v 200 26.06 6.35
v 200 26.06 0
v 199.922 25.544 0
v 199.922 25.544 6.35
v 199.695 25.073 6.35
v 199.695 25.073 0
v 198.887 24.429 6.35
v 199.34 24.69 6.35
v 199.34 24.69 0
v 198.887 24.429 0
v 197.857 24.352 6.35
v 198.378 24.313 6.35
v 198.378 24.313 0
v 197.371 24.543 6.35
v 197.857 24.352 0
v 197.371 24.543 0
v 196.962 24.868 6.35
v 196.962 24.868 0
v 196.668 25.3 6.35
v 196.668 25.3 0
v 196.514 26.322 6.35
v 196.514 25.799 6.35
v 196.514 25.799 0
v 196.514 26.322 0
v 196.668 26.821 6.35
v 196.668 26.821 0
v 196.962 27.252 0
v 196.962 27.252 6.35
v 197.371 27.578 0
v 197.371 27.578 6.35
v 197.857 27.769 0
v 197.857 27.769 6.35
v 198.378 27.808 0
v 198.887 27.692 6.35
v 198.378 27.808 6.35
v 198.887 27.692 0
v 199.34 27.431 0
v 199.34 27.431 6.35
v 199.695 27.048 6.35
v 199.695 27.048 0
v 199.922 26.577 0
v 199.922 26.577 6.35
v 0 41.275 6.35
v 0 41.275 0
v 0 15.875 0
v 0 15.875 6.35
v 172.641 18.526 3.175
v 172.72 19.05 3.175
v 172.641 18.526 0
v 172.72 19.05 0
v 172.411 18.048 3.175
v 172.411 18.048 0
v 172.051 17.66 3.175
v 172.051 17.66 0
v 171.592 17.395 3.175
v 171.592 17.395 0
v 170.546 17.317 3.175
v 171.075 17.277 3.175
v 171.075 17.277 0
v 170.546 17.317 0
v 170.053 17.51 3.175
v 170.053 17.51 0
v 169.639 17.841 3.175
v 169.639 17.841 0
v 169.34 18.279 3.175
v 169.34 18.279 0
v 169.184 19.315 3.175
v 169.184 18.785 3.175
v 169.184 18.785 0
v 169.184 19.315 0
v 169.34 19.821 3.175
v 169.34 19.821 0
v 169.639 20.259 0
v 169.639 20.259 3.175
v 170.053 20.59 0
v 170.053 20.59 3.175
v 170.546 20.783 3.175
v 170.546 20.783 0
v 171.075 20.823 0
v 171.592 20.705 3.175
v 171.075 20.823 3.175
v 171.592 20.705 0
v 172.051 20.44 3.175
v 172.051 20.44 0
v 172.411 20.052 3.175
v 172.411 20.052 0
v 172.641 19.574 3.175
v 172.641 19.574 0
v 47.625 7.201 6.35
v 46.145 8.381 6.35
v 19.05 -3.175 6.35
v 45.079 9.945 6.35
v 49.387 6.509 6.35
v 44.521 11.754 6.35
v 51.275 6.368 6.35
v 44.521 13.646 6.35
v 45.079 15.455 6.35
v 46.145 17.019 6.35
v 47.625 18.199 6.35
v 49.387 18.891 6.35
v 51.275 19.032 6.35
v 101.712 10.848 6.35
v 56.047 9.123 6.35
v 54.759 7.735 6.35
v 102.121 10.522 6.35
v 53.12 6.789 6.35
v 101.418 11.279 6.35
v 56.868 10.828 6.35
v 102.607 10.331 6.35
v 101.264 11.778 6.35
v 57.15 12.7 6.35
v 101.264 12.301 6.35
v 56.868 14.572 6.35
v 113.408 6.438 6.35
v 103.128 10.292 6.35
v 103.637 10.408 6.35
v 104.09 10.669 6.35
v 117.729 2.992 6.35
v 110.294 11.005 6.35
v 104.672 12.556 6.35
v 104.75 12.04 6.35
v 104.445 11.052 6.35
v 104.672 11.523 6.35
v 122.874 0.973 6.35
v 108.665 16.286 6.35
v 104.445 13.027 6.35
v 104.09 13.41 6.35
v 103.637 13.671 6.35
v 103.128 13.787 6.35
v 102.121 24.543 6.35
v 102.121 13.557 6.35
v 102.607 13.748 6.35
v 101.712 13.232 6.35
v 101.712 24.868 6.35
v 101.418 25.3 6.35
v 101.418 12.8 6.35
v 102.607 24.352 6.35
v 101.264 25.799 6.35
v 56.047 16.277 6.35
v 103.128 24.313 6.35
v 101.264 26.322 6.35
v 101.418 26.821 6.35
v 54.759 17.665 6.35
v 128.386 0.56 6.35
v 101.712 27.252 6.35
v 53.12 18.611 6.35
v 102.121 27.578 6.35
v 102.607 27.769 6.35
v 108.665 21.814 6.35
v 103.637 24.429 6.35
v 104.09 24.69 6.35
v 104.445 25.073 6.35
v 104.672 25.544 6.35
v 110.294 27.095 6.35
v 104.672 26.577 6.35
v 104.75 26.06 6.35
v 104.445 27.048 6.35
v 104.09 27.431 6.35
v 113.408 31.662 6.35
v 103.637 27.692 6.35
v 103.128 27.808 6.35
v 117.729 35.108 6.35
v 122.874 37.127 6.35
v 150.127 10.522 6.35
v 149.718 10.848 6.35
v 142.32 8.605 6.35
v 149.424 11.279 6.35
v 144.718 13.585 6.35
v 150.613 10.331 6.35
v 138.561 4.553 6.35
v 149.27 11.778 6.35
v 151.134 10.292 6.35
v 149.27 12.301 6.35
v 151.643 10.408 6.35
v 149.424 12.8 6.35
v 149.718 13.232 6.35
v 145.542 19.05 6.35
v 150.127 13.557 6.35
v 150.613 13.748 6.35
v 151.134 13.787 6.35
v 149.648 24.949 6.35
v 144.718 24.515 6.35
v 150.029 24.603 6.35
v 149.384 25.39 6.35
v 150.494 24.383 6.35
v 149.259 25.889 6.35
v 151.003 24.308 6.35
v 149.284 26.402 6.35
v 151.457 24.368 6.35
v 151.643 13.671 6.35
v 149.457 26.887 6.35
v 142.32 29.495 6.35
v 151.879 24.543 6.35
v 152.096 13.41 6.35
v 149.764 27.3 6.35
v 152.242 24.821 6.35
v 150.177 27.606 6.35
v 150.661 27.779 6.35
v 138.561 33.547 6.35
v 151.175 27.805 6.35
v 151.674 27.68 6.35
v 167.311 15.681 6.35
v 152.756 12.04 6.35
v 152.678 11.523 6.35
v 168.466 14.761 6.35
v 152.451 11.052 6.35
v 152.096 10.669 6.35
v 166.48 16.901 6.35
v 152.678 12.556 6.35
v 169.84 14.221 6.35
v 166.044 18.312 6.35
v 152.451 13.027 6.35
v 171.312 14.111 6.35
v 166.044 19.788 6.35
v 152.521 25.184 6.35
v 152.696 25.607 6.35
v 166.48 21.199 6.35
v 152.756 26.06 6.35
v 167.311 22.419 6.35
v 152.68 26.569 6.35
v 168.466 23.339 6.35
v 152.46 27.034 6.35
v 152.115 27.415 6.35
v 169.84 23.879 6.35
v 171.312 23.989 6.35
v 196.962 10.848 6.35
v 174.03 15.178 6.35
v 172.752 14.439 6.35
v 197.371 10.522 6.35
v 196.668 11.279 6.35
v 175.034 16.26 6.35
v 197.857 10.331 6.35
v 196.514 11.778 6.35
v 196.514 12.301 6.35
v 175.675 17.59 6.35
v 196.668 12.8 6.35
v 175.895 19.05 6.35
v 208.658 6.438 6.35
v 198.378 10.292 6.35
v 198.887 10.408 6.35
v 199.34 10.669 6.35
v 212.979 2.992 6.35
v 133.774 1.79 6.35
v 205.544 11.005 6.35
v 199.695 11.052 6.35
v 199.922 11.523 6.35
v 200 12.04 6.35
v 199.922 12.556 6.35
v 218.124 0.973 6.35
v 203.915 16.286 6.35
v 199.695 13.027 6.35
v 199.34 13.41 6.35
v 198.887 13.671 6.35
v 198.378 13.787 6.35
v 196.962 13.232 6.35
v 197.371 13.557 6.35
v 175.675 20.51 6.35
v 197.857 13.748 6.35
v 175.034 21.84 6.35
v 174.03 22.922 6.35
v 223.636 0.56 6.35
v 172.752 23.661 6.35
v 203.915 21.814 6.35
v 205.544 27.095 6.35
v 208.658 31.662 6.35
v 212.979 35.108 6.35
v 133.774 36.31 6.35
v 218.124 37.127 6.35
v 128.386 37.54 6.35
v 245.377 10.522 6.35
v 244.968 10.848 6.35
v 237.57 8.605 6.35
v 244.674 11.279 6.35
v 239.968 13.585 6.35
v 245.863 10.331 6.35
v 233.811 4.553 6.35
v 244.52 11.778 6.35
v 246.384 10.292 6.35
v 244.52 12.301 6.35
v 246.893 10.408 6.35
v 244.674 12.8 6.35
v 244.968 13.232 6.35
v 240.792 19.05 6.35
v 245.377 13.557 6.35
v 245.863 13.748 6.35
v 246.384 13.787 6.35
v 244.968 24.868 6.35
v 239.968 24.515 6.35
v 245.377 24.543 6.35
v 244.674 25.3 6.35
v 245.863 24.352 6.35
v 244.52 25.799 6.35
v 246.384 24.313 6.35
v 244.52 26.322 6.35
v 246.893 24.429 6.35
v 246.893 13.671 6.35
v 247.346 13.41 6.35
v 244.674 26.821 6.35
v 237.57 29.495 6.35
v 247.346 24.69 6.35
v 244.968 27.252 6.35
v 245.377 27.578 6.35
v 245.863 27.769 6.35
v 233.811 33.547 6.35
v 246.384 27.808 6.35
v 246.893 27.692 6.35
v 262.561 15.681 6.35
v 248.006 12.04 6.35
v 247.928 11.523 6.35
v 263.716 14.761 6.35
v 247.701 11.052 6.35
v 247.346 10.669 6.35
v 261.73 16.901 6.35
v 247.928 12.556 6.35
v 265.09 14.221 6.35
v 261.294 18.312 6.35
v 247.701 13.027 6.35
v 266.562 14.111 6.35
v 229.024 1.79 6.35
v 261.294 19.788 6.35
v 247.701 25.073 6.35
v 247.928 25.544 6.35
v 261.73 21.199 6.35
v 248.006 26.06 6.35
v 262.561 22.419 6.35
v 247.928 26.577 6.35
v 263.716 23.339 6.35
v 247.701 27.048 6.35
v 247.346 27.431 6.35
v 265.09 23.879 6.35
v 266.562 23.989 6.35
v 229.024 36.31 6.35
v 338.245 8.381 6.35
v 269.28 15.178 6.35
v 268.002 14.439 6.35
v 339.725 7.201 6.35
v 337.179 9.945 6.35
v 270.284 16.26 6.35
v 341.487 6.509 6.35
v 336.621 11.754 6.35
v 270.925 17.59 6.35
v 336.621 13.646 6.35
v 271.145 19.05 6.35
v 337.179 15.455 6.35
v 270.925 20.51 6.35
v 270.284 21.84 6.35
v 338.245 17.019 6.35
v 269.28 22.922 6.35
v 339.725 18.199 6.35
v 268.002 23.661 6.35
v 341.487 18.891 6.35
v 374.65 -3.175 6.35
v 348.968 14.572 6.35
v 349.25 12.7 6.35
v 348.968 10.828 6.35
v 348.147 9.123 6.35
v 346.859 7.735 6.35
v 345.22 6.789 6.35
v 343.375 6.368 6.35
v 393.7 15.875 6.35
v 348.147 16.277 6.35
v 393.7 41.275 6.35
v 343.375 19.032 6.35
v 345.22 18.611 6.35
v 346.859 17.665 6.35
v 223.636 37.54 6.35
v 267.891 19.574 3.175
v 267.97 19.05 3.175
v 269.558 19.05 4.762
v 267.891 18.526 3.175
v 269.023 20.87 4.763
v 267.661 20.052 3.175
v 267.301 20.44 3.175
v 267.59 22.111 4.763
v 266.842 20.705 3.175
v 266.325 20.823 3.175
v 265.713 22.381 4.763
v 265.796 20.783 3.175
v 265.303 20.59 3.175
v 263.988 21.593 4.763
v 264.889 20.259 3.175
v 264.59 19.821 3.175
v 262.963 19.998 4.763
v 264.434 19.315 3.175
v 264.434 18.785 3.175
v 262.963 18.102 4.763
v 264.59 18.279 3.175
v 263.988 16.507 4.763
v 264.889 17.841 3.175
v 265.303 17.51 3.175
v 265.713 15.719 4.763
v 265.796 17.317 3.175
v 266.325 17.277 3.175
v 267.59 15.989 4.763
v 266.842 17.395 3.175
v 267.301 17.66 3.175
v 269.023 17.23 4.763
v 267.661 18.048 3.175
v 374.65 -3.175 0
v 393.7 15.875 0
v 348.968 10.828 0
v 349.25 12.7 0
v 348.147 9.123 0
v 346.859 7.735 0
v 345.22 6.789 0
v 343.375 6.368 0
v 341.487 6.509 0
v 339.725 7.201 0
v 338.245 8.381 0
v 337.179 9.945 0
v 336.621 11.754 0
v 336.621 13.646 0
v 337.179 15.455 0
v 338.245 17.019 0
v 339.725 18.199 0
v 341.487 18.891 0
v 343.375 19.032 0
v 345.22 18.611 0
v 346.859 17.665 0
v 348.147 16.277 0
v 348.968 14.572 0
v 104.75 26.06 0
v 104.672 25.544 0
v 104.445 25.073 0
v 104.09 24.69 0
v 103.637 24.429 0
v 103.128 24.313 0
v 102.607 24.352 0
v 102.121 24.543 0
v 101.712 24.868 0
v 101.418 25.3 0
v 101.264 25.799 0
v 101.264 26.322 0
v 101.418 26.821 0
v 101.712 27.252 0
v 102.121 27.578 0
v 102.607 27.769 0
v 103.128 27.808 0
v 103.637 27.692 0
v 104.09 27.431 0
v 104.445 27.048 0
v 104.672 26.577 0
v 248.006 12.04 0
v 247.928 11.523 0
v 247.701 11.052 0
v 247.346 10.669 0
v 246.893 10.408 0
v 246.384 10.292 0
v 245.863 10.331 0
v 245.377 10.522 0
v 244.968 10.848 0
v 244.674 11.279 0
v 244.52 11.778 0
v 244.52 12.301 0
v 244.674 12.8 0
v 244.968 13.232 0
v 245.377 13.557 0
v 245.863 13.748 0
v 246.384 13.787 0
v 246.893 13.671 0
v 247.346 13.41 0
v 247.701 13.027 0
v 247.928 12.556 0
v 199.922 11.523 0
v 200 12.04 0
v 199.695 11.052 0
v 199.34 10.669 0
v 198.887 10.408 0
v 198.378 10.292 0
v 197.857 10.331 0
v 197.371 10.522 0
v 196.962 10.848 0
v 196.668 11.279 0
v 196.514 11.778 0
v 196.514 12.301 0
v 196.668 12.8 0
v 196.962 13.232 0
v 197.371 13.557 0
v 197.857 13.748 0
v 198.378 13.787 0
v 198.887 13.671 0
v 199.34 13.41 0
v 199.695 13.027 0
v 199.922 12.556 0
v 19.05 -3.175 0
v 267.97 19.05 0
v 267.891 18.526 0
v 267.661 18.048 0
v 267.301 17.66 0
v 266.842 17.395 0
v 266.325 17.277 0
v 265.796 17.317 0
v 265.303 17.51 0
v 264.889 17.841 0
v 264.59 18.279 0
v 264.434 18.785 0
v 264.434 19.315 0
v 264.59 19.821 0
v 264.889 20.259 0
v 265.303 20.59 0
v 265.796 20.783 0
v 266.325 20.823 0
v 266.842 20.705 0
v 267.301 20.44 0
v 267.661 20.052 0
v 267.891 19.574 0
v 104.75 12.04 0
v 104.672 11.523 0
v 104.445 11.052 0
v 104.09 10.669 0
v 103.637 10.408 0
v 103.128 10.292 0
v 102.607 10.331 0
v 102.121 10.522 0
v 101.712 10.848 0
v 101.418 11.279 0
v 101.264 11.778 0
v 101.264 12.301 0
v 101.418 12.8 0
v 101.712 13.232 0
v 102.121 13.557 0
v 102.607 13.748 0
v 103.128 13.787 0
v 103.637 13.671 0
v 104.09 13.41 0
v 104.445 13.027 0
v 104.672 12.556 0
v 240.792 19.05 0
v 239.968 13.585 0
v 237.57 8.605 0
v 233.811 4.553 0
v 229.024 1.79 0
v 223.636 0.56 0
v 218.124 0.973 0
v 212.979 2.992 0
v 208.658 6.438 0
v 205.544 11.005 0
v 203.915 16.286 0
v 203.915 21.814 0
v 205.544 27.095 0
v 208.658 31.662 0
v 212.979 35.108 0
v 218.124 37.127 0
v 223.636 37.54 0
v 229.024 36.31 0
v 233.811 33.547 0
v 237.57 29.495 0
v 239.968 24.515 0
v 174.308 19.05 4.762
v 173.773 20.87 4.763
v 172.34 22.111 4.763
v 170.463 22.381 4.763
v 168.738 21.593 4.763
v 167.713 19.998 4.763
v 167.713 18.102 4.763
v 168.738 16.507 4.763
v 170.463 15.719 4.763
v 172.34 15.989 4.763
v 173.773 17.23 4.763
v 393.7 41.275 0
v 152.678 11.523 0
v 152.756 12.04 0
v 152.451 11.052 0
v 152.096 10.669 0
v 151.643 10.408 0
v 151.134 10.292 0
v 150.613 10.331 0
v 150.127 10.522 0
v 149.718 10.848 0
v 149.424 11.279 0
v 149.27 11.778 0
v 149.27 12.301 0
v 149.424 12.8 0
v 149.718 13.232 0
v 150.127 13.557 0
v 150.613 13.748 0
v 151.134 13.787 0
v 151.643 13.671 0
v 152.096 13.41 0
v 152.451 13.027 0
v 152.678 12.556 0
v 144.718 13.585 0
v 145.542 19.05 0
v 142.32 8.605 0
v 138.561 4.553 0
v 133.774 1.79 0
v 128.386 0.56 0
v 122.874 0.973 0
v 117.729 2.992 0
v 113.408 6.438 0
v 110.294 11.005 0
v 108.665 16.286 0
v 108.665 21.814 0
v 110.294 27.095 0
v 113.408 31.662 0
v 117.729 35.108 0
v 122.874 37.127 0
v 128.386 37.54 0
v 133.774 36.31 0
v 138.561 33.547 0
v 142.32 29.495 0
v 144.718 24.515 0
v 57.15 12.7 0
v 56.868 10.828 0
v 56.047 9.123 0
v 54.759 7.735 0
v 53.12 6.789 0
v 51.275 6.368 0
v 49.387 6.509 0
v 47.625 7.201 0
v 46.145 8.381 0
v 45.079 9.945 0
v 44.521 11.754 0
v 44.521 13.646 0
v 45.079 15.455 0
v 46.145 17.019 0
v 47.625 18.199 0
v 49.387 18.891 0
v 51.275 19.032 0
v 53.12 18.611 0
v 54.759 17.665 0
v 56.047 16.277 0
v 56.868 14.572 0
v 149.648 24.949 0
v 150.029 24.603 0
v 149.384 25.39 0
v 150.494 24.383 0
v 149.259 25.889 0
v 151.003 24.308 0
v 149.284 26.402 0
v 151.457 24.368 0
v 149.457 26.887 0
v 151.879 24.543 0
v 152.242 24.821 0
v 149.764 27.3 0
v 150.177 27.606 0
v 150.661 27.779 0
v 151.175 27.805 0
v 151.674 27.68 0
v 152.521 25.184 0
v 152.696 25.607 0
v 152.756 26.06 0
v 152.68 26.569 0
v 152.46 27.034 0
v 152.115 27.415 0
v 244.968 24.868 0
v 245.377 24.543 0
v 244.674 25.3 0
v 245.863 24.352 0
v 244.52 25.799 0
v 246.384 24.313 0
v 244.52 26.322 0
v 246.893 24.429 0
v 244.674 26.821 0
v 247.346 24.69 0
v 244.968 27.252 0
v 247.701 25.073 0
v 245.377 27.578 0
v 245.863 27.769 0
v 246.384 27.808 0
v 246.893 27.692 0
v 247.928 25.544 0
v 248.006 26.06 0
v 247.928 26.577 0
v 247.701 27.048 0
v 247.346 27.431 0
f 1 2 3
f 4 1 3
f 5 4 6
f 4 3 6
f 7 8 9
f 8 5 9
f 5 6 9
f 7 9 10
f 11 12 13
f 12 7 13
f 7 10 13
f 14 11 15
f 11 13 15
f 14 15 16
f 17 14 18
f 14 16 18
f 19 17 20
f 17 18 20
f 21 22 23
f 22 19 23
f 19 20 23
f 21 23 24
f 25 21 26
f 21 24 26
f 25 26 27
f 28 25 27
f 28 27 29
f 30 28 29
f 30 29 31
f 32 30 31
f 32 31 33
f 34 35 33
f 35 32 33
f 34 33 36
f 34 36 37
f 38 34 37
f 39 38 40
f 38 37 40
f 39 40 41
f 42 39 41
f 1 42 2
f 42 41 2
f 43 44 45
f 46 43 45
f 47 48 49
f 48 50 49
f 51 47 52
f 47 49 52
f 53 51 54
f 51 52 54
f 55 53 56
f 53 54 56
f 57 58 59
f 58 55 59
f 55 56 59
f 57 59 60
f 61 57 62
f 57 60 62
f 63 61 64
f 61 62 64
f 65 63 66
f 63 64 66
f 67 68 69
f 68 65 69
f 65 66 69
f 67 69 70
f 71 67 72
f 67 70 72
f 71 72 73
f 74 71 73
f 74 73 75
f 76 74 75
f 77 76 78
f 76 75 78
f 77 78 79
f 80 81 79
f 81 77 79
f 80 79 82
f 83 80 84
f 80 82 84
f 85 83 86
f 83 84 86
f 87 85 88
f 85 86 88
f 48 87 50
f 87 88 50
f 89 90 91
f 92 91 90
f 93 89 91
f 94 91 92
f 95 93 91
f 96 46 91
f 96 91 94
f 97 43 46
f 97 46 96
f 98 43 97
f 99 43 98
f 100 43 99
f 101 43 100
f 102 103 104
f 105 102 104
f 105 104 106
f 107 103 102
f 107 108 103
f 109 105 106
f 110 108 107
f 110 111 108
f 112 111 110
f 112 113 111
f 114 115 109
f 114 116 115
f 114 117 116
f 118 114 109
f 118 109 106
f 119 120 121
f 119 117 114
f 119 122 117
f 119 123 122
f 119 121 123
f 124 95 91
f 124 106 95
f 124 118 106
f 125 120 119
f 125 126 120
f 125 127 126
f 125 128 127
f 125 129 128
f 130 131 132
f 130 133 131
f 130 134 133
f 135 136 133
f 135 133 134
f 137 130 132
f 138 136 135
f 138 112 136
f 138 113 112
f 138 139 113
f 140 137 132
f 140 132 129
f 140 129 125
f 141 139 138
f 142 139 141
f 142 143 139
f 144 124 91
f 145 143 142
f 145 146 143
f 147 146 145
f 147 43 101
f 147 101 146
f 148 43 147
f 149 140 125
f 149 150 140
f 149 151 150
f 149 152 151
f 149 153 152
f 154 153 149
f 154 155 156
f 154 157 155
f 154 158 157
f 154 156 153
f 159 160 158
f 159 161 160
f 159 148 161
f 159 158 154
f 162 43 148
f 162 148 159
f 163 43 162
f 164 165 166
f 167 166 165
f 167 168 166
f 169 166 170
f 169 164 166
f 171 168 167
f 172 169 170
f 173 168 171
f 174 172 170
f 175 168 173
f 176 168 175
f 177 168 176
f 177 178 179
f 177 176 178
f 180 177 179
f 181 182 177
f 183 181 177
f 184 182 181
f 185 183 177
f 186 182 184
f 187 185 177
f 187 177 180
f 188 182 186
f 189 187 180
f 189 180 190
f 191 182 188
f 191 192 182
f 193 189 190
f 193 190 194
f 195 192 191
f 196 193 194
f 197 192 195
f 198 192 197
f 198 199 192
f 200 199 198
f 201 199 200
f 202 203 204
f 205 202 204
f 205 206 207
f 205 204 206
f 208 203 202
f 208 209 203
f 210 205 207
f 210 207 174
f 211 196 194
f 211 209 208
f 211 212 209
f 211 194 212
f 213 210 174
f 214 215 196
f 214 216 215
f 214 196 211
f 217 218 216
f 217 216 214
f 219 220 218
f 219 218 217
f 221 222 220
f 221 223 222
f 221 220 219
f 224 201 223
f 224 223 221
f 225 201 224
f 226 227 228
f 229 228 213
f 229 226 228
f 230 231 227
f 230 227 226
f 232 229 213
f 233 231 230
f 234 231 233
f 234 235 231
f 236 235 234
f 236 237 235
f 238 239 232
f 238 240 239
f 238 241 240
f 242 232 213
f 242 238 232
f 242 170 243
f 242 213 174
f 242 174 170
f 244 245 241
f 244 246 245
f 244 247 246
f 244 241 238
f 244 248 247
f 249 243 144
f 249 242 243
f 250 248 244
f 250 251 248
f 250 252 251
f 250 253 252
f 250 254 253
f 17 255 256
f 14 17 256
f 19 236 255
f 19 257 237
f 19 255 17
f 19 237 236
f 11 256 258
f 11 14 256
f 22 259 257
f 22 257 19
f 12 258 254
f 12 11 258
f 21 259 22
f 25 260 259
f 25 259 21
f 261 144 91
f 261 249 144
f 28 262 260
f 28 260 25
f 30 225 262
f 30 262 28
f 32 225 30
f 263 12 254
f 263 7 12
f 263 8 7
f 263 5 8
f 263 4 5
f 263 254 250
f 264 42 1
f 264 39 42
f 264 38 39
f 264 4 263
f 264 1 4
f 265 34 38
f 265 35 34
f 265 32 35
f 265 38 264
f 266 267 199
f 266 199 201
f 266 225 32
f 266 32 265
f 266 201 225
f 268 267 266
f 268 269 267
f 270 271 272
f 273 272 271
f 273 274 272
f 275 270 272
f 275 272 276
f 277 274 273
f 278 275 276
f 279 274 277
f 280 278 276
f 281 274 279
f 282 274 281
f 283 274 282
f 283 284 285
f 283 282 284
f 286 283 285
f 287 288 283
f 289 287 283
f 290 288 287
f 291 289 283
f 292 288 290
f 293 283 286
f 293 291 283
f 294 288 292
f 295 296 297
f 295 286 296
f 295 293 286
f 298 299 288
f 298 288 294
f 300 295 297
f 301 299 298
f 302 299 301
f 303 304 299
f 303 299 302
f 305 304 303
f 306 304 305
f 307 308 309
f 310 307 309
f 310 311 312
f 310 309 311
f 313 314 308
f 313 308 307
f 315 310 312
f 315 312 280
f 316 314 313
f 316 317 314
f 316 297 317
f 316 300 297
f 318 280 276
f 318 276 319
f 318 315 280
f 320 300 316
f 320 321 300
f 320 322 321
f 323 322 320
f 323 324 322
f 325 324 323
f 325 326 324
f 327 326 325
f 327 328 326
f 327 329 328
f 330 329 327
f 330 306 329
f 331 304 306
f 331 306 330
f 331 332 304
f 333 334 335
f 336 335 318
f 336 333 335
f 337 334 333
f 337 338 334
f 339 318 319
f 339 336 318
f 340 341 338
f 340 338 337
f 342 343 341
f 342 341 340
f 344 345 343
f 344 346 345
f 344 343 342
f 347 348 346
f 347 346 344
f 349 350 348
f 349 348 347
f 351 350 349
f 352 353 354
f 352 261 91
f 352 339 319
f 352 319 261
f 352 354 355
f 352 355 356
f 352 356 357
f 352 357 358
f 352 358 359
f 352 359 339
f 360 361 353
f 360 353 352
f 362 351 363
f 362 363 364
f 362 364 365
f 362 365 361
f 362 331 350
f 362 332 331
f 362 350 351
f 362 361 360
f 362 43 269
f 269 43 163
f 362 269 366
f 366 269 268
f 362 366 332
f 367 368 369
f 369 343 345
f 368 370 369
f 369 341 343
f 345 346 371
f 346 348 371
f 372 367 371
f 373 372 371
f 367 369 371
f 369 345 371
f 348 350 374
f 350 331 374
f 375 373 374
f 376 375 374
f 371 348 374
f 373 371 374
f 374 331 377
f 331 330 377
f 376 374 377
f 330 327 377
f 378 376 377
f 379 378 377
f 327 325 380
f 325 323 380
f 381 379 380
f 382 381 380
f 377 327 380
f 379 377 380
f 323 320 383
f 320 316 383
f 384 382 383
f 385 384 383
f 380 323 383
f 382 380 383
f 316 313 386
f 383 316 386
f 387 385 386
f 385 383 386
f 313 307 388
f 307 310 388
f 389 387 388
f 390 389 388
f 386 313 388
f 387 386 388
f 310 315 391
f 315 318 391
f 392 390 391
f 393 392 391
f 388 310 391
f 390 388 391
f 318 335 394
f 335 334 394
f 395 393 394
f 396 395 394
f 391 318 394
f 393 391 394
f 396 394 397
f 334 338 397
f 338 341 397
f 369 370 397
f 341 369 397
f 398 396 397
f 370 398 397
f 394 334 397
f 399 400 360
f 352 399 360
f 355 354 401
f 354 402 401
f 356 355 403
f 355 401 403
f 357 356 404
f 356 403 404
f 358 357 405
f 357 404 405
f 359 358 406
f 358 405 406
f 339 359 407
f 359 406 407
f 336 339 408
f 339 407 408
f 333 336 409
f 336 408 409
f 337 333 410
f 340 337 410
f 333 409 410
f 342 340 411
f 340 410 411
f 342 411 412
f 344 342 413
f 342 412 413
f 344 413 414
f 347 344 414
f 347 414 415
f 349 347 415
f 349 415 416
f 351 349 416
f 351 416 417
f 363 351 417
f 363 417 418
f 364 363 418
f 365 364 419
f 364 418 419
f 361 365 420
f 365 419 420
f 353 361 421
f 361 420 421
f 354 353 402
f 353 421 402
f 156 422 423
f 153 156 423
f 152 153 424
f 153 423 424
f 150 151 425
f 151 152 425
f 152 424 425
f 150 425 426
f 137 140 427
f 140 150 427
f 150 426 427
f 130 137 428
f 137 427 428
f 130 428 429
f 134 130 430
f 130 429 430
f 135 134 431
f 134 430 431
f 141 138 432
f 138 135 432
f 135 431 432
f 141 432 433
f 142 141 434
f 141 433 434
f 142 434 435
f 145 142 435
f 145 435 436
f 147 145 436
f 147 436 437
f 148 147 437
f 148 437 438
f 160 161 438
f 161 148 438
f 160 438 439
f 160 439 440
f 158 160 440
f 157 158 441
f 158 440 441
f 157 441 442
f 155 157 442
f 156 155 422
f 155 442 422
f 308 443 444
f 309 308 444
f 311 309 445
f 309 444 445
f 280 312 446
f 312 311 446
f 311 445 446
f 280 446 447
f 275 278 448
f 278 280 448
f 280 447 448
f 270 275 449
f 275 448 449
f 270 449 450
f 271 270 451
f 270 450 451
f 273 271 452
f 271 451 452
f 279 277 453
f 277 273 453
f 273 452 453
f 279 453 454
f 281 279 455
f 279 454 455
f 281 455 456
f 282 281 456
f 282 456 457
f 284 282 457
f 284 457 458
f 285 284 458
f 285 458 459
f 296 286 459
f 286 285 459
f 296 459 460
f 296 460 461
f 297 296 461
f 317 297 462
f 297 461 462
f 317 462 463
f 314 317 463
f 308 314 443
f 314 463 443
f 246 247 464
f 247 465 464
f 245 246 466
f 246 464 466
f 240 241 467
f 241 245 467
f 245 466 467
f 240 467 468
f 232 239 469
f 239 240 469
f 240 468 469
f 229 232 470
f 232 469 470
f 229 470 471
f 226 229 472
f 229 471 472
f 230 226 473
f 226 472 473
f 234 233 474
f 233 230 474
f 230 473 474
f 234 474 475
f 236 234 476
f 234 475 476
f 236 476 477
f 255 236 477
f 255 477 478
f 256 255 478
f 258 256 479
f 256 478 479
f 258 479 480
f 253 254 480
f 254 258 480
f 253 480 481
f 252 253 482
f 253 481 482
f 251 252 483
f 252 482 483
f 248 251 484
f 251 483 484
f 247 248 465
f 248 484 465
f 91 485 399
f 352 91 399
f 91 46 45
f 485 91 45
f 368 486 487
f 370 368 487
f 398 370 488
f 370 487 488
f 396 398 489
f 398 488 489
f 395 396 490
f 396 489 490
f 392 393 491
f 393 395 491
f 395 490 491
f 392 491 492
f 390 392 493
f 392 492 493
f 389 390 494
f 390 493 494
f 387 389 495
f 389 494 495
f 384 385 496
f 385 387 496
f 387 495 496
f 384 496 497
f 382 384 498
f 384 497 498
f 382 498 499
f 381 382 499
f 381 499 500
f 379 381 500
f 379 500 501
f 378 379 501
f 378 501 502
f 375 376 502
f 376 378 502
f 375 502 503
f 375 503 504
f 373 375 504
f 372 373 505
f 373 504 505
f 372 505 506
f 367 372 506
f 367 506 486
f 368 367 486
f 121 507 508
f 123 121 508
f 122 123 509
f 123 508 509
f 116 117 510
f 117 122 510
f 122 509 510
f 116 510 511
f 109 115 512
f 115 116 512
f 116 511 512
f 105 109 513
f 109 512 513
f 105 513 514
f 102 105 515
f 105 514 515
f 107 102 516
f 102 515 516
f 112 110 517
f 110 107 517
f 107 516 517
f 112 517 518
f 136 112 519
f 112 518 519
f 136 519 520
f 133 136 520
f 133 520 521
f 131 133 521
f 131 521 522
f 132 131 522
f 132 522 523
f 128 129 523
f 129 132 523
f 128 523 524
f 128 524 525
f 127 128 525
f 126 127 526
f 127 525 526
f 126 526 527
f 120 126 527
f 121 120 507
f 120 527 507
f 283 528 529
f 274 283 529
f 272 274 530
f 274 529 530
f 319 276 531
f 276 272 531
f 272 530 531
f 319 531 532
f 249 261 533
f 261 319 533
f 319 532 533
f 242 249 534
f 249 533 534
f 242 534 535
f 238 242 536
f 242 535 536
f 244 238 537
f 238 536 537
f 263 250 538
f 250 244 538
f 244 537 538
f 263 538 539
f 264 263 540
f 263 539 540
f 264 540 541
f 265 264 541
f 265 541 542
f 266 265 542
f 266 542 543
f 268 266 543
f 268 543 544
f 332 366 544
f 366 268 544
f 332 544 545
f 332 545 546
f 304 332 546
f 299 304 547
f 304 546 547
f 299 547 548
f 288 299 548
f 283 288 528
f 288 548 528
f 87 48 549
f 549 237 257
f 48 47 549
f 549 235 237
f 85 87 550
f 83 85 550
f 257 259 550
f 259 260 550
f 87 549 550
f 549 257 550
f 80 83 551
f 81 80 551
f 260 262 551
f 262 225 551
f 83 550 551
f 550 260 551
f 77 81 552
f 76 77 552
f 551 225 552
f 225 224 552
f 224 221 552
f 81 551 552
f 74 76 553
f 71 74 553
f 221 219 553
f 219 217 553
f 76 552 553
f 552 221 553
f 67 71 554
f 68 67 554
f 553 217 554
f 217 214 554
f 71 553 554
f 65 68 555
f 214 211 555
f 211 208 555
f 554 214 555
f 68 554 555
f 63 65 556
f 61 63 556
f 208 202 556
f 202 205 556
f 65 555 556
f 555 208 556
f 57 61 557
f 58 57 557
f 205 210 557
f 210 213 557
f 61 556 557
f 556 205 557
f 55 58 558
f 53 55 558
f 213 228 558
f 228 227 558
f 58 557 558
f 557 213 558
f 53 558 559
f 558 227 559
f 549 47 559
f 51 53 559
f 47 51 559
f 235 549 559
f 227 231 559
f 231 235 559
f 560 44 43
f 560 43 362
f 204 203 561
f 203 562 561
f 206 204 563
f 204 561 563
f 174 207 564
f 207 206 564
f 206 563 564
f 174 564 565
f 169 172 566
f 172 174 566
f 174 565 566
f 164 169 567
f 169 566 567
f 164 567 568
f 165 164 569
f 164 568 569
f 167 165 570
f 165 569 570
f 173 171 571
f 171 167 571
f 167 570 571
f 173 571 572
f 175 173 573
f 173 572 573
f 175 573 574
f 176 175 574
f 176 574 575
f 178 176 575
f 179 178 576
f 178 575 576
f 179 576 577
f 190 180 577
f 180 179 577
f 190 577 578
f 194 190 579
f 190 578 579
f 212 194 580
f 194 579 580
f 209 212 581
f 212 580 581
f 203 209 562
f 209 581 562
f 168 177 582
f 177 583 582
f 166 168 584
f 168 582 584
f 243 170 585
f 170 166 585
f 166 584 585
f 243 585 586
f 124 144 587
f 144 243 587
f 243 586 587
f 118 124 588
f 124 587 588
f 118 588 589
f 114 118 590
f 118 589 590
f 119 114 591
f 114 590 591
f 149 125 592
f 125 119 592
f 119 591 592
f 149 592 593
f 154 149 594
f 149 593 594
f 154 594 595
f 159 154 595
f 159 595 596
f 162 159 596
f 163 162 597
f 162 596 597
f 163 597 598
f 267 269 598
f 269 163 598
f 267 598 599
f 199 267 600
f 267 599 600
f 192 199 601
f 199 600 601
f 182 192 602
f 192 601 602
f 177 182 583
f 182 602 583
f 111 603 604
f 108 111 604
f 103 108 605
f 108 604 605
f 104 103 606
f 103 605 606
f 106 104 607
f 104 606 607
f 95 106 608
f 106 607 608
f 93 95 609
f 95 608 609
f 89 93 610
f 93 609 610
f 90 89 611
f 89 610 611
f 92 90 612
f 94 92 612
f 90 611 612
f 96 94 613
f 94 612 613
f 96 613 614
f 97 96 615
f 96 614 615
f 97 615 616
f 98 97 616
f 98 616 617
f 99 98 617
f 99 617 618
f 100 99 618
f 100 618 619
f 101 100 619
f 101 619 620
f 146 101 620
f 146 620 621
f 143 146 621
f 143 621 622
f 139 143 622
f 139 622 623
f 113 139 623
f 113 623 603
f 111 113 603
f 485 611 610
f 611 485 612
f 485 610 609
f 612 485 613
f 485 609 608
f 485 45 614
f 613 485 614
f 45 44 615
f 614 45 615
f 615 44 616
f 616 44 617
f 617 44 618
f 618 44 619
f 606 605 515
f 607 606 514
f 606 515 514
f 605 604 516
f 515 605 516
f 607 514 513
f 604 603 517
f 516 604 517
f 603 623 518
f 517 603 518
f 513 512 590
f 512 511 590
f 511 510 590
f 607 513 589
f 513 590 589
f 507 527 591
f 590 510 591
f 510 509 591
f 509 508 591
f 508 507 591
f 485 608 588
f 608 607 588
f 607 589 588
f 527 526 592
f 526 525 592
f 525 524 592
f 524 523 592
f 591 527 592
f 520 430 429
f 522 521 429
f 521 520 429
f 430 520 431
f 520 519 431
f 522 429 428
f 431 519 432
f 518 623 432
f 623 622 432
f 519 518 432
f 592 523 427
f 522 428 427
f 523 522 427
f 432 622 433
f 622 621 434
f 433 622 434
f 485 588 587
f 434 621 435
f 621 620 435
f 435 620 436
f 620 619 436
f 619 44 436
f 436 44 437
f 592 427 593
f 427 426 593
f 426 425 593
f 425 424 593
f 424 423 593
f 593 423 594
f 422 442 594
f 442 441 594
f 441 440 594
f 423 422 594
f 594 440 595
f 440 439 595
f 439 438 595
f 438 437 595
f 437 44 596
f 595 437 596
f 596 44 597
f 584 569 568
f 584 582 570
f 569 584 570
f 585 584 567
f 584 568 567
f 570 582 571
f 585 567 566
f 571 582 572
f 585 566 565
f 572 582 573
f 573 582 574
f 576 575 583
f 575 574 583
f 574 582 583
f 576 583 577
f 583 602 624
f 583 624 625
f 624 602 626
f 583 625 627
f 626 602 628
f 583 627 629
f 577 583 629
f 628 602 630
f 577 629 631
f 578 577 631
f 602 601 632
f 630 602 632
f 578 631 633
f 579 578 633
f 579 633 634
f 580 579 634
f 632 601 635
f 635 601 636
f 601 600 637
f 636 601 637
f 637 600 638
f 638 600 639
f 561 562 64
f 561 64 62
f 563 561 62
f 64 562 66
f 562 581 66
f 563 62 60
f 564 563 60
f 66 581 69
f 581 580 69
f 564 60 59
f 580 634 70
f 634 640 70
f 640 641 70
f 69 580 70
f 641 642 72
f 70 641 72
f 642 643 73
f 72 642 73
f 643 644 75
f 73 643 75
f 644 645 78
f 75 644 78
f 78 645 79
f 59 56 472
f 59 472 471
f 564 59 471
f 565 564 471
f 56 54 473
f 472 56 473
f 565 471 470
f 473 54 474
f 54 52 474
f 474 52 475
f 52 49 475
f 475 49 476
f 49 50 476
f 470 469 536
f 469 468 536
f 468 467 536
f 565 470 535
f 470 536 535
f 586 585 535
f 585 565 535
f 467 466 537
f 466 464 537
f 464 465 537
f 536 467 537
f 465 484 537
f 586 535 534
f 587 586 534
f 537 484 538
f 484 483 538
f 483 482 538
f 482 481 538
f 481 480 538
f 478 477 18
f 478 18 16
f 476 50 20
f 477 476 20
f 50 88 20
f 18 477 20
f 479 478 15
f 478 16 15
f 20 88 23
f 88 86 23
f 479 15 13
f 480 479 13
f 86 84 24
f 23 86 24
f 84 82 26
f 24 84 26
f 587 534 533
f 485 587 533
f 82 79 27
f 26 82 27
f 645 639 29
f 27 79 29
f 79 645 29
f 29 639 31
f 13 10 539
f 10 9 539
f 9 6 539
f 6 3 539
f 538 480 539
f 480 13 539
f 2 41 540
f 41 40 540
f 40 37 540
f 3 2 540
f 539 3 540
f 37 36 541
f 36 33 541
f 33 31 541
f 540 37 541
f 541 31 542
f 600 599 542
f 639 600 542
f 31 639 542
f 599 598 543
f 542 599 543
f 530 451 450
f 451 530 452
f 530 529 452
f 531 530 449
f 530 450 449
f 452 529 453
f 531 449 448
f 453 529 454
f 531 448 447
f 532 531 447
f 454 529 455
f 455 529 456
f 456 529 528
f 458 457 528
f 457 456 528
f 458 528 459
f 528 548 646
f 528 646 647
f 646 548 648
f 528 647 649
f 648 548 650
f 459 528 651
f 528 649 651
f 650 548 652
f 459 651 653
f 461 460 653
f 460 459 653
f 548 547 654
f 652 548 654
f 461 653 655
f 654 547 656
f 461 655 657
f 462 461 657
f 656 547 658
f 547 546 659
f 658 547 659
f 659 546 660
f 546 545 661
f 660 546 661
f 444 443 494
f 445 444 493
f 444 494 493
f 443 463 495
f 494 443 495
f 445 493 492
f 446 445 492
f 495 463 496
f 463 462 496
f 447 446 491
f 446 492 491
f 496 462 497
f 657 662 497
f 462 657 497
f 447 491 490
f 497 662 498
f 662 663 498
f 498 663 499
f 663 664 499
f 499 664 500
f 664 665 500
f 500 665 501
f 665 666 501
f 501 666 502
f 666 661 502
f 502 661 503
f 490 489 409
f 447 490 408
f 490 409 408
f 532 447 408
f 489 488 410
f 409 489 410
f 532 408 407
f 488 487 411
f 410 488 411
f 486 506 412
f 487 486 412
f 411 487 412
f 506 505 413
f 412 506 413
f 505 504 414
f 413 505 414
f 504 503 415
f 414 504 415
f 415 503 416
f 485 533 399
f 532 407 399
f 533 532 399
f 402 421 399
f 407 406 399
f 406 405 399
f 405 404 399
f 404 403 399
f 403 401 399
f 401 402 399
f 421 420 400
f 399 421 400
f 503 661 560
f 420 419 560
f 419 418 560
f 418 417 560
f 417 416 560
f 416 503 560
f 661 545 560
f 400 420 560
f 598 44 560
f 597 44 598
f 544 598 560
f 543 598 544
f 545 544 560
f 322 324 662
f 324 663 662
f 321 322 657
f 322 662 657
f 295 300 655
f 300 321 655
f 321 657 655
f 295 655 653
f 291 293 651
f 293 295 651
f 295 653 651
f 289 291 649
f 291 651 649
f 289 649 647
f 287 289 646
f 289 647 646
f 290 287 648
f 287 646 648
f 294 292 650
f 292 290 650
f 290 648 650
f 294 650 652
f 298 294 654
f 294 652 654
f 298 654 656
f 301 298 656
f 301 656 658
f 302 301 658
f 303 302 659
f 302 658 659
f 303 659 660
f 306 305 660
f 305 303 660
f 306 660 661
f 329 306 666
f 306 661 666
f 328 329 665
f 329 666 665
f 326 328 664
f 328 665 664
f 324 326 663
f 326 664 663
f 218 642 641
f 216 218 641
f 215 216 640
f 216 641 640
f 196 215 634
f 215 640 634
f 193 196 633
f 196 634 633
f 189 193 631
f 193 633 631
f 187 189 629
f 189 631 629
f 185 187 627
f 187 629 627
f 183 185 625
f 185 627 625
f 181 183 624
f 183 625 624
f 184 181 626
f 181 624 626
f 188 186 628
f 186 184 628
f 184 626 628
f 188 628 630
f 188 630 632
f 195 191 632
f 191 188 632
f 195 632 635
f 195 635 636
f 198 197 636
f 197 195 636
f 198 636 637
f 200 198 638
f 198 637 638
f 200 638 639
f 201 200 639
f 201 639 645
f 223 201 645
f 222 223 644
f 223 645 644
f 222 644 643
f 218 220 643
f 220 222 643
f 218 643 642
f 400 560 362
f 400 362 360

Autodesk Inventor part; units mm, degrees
ref_plane "YZ Plane" through (0, 0, 0) normal (1, 0, 0) x (0, 1, 0)
ref_plane "XZ Plane" through (0, 0, 0) normal (0, 1, 0) x (-1, 0, 0)
ref_plane "XY Plane" through (0, 0, 0) normal (0, 0, 1) x (1, 0, 0)
sketch "Sketch1" plane through (0, 0, 0) normal (0, 0, 1) x (1, 0, 0)
  circle A0 centre (127, 19.05) radius 18.542
  circle A1 centre (222.25, 19.05) radius 18.542
  circle A2 centre (170.942, 19.05) radius 1.778
  circle A3 centre (266.192, 19.05) radius 1.778
  line L0 (151.003, 19.05) -> (151.003, 26.0604)
  circle A4 centre (102.997, 12.0396) radius 1.7526
  circle A5 centre (102.997, 26.0604) radius 1.7526
  circle A6 centre (151.003, 26.0604) radius 1.7526
  circle A7 centre (151.003, 12.0396) radius 1.7526
  line L1 (151.003, 19.05) -> (127, 19.05)
  circle A8 centre (246.253, 26.0604) radius 1.7526
  circle A9 centre (246.253, 12.0396) radius 1.7526
  circle A10 centre (198.247, 12.0396) radius 1.7526
  circle A11 centre (198.247, 26.0604) radius 1.7526
  line L2 (0, -3.175) -> (393.7, -3.175)
  line L3 (0, 41.275) -> (393.7, 41.275)
  line L4 (0, 41.275) -> (0, -3.175)
  line L5 (393.7, 41.275) -> (393.7, -3.175)
  circle A12 centre (222.25, 19.05) radius 18.542
  circle A13 centre (246.253, 26.0604) radius 1.7526
  circle A14 centre (246.253, 12.0396) radius 1.7526
  circle A15 centre (266.192, 19.05) radius 1.778
  circle A16 centre (198.247, 12.0396) radius 1.7526
  circle A17 centre (198.247, 26.0604) radius 1.7526
  circle A18 centre (170.942, 19.05) radius 1.778
  circle A19 centre (151.003, 12.0396) radius 1.7526
  circle A20 centre (151.003, 26.0604) radius 1.7526
  circle A21 centre (127, 19.05) radius 18.542
  circle A22 centre (102.997, 12.0396) radius 1.7526
  circle A23 centre (102.997, 26.0604) radius 1.7526
  circle A24 centre (50.8, 12.7) radius 6.35
  circle A25 centre (342.9, 12.7) radius 6.35
  point P0 (0, 0)
  dimension "d3" = 37.084
  dimension "d5" = 37.084
  dimension "d10" = 3.556
  dimension "d11" = 3.556
  dimension "d24" = 7.0104
  dimension "d28" = 3.5052
  dimension "d29" = 3.5052
  dimension "d30" = 3.5052
  dimension "d31" = 24.003
  dimension "d38" = 3.5052
  dimension "d39" = 3.5052
  dimension "d40" = 3.5052
  dimension "d41" = 3.5052
extrude "Extrusion4" add sketch "Sketch1" along normal blind 6.35 contours L4 L3 L5 L2 | A24 | A25
chamfer "Chamfer2" distance 3.175 angle 45 2 edges at (169.164, 19.05, 6.35) (264.414, 19.05, 6.35)
extrude "Extrusion5" cut sketch "Sketch1" along normal blind 25.4 contours A24 | A25
chamfer "Chamfer3" distance 19.05 angle 45 1 edges at (0, -3.175, 3.175)
chamfer "Chamfer4" distance 19.05 angle 45 1 edges at (393.7, -3.175, 3.175)
properties part number "Drive Train - Smallest Model"
